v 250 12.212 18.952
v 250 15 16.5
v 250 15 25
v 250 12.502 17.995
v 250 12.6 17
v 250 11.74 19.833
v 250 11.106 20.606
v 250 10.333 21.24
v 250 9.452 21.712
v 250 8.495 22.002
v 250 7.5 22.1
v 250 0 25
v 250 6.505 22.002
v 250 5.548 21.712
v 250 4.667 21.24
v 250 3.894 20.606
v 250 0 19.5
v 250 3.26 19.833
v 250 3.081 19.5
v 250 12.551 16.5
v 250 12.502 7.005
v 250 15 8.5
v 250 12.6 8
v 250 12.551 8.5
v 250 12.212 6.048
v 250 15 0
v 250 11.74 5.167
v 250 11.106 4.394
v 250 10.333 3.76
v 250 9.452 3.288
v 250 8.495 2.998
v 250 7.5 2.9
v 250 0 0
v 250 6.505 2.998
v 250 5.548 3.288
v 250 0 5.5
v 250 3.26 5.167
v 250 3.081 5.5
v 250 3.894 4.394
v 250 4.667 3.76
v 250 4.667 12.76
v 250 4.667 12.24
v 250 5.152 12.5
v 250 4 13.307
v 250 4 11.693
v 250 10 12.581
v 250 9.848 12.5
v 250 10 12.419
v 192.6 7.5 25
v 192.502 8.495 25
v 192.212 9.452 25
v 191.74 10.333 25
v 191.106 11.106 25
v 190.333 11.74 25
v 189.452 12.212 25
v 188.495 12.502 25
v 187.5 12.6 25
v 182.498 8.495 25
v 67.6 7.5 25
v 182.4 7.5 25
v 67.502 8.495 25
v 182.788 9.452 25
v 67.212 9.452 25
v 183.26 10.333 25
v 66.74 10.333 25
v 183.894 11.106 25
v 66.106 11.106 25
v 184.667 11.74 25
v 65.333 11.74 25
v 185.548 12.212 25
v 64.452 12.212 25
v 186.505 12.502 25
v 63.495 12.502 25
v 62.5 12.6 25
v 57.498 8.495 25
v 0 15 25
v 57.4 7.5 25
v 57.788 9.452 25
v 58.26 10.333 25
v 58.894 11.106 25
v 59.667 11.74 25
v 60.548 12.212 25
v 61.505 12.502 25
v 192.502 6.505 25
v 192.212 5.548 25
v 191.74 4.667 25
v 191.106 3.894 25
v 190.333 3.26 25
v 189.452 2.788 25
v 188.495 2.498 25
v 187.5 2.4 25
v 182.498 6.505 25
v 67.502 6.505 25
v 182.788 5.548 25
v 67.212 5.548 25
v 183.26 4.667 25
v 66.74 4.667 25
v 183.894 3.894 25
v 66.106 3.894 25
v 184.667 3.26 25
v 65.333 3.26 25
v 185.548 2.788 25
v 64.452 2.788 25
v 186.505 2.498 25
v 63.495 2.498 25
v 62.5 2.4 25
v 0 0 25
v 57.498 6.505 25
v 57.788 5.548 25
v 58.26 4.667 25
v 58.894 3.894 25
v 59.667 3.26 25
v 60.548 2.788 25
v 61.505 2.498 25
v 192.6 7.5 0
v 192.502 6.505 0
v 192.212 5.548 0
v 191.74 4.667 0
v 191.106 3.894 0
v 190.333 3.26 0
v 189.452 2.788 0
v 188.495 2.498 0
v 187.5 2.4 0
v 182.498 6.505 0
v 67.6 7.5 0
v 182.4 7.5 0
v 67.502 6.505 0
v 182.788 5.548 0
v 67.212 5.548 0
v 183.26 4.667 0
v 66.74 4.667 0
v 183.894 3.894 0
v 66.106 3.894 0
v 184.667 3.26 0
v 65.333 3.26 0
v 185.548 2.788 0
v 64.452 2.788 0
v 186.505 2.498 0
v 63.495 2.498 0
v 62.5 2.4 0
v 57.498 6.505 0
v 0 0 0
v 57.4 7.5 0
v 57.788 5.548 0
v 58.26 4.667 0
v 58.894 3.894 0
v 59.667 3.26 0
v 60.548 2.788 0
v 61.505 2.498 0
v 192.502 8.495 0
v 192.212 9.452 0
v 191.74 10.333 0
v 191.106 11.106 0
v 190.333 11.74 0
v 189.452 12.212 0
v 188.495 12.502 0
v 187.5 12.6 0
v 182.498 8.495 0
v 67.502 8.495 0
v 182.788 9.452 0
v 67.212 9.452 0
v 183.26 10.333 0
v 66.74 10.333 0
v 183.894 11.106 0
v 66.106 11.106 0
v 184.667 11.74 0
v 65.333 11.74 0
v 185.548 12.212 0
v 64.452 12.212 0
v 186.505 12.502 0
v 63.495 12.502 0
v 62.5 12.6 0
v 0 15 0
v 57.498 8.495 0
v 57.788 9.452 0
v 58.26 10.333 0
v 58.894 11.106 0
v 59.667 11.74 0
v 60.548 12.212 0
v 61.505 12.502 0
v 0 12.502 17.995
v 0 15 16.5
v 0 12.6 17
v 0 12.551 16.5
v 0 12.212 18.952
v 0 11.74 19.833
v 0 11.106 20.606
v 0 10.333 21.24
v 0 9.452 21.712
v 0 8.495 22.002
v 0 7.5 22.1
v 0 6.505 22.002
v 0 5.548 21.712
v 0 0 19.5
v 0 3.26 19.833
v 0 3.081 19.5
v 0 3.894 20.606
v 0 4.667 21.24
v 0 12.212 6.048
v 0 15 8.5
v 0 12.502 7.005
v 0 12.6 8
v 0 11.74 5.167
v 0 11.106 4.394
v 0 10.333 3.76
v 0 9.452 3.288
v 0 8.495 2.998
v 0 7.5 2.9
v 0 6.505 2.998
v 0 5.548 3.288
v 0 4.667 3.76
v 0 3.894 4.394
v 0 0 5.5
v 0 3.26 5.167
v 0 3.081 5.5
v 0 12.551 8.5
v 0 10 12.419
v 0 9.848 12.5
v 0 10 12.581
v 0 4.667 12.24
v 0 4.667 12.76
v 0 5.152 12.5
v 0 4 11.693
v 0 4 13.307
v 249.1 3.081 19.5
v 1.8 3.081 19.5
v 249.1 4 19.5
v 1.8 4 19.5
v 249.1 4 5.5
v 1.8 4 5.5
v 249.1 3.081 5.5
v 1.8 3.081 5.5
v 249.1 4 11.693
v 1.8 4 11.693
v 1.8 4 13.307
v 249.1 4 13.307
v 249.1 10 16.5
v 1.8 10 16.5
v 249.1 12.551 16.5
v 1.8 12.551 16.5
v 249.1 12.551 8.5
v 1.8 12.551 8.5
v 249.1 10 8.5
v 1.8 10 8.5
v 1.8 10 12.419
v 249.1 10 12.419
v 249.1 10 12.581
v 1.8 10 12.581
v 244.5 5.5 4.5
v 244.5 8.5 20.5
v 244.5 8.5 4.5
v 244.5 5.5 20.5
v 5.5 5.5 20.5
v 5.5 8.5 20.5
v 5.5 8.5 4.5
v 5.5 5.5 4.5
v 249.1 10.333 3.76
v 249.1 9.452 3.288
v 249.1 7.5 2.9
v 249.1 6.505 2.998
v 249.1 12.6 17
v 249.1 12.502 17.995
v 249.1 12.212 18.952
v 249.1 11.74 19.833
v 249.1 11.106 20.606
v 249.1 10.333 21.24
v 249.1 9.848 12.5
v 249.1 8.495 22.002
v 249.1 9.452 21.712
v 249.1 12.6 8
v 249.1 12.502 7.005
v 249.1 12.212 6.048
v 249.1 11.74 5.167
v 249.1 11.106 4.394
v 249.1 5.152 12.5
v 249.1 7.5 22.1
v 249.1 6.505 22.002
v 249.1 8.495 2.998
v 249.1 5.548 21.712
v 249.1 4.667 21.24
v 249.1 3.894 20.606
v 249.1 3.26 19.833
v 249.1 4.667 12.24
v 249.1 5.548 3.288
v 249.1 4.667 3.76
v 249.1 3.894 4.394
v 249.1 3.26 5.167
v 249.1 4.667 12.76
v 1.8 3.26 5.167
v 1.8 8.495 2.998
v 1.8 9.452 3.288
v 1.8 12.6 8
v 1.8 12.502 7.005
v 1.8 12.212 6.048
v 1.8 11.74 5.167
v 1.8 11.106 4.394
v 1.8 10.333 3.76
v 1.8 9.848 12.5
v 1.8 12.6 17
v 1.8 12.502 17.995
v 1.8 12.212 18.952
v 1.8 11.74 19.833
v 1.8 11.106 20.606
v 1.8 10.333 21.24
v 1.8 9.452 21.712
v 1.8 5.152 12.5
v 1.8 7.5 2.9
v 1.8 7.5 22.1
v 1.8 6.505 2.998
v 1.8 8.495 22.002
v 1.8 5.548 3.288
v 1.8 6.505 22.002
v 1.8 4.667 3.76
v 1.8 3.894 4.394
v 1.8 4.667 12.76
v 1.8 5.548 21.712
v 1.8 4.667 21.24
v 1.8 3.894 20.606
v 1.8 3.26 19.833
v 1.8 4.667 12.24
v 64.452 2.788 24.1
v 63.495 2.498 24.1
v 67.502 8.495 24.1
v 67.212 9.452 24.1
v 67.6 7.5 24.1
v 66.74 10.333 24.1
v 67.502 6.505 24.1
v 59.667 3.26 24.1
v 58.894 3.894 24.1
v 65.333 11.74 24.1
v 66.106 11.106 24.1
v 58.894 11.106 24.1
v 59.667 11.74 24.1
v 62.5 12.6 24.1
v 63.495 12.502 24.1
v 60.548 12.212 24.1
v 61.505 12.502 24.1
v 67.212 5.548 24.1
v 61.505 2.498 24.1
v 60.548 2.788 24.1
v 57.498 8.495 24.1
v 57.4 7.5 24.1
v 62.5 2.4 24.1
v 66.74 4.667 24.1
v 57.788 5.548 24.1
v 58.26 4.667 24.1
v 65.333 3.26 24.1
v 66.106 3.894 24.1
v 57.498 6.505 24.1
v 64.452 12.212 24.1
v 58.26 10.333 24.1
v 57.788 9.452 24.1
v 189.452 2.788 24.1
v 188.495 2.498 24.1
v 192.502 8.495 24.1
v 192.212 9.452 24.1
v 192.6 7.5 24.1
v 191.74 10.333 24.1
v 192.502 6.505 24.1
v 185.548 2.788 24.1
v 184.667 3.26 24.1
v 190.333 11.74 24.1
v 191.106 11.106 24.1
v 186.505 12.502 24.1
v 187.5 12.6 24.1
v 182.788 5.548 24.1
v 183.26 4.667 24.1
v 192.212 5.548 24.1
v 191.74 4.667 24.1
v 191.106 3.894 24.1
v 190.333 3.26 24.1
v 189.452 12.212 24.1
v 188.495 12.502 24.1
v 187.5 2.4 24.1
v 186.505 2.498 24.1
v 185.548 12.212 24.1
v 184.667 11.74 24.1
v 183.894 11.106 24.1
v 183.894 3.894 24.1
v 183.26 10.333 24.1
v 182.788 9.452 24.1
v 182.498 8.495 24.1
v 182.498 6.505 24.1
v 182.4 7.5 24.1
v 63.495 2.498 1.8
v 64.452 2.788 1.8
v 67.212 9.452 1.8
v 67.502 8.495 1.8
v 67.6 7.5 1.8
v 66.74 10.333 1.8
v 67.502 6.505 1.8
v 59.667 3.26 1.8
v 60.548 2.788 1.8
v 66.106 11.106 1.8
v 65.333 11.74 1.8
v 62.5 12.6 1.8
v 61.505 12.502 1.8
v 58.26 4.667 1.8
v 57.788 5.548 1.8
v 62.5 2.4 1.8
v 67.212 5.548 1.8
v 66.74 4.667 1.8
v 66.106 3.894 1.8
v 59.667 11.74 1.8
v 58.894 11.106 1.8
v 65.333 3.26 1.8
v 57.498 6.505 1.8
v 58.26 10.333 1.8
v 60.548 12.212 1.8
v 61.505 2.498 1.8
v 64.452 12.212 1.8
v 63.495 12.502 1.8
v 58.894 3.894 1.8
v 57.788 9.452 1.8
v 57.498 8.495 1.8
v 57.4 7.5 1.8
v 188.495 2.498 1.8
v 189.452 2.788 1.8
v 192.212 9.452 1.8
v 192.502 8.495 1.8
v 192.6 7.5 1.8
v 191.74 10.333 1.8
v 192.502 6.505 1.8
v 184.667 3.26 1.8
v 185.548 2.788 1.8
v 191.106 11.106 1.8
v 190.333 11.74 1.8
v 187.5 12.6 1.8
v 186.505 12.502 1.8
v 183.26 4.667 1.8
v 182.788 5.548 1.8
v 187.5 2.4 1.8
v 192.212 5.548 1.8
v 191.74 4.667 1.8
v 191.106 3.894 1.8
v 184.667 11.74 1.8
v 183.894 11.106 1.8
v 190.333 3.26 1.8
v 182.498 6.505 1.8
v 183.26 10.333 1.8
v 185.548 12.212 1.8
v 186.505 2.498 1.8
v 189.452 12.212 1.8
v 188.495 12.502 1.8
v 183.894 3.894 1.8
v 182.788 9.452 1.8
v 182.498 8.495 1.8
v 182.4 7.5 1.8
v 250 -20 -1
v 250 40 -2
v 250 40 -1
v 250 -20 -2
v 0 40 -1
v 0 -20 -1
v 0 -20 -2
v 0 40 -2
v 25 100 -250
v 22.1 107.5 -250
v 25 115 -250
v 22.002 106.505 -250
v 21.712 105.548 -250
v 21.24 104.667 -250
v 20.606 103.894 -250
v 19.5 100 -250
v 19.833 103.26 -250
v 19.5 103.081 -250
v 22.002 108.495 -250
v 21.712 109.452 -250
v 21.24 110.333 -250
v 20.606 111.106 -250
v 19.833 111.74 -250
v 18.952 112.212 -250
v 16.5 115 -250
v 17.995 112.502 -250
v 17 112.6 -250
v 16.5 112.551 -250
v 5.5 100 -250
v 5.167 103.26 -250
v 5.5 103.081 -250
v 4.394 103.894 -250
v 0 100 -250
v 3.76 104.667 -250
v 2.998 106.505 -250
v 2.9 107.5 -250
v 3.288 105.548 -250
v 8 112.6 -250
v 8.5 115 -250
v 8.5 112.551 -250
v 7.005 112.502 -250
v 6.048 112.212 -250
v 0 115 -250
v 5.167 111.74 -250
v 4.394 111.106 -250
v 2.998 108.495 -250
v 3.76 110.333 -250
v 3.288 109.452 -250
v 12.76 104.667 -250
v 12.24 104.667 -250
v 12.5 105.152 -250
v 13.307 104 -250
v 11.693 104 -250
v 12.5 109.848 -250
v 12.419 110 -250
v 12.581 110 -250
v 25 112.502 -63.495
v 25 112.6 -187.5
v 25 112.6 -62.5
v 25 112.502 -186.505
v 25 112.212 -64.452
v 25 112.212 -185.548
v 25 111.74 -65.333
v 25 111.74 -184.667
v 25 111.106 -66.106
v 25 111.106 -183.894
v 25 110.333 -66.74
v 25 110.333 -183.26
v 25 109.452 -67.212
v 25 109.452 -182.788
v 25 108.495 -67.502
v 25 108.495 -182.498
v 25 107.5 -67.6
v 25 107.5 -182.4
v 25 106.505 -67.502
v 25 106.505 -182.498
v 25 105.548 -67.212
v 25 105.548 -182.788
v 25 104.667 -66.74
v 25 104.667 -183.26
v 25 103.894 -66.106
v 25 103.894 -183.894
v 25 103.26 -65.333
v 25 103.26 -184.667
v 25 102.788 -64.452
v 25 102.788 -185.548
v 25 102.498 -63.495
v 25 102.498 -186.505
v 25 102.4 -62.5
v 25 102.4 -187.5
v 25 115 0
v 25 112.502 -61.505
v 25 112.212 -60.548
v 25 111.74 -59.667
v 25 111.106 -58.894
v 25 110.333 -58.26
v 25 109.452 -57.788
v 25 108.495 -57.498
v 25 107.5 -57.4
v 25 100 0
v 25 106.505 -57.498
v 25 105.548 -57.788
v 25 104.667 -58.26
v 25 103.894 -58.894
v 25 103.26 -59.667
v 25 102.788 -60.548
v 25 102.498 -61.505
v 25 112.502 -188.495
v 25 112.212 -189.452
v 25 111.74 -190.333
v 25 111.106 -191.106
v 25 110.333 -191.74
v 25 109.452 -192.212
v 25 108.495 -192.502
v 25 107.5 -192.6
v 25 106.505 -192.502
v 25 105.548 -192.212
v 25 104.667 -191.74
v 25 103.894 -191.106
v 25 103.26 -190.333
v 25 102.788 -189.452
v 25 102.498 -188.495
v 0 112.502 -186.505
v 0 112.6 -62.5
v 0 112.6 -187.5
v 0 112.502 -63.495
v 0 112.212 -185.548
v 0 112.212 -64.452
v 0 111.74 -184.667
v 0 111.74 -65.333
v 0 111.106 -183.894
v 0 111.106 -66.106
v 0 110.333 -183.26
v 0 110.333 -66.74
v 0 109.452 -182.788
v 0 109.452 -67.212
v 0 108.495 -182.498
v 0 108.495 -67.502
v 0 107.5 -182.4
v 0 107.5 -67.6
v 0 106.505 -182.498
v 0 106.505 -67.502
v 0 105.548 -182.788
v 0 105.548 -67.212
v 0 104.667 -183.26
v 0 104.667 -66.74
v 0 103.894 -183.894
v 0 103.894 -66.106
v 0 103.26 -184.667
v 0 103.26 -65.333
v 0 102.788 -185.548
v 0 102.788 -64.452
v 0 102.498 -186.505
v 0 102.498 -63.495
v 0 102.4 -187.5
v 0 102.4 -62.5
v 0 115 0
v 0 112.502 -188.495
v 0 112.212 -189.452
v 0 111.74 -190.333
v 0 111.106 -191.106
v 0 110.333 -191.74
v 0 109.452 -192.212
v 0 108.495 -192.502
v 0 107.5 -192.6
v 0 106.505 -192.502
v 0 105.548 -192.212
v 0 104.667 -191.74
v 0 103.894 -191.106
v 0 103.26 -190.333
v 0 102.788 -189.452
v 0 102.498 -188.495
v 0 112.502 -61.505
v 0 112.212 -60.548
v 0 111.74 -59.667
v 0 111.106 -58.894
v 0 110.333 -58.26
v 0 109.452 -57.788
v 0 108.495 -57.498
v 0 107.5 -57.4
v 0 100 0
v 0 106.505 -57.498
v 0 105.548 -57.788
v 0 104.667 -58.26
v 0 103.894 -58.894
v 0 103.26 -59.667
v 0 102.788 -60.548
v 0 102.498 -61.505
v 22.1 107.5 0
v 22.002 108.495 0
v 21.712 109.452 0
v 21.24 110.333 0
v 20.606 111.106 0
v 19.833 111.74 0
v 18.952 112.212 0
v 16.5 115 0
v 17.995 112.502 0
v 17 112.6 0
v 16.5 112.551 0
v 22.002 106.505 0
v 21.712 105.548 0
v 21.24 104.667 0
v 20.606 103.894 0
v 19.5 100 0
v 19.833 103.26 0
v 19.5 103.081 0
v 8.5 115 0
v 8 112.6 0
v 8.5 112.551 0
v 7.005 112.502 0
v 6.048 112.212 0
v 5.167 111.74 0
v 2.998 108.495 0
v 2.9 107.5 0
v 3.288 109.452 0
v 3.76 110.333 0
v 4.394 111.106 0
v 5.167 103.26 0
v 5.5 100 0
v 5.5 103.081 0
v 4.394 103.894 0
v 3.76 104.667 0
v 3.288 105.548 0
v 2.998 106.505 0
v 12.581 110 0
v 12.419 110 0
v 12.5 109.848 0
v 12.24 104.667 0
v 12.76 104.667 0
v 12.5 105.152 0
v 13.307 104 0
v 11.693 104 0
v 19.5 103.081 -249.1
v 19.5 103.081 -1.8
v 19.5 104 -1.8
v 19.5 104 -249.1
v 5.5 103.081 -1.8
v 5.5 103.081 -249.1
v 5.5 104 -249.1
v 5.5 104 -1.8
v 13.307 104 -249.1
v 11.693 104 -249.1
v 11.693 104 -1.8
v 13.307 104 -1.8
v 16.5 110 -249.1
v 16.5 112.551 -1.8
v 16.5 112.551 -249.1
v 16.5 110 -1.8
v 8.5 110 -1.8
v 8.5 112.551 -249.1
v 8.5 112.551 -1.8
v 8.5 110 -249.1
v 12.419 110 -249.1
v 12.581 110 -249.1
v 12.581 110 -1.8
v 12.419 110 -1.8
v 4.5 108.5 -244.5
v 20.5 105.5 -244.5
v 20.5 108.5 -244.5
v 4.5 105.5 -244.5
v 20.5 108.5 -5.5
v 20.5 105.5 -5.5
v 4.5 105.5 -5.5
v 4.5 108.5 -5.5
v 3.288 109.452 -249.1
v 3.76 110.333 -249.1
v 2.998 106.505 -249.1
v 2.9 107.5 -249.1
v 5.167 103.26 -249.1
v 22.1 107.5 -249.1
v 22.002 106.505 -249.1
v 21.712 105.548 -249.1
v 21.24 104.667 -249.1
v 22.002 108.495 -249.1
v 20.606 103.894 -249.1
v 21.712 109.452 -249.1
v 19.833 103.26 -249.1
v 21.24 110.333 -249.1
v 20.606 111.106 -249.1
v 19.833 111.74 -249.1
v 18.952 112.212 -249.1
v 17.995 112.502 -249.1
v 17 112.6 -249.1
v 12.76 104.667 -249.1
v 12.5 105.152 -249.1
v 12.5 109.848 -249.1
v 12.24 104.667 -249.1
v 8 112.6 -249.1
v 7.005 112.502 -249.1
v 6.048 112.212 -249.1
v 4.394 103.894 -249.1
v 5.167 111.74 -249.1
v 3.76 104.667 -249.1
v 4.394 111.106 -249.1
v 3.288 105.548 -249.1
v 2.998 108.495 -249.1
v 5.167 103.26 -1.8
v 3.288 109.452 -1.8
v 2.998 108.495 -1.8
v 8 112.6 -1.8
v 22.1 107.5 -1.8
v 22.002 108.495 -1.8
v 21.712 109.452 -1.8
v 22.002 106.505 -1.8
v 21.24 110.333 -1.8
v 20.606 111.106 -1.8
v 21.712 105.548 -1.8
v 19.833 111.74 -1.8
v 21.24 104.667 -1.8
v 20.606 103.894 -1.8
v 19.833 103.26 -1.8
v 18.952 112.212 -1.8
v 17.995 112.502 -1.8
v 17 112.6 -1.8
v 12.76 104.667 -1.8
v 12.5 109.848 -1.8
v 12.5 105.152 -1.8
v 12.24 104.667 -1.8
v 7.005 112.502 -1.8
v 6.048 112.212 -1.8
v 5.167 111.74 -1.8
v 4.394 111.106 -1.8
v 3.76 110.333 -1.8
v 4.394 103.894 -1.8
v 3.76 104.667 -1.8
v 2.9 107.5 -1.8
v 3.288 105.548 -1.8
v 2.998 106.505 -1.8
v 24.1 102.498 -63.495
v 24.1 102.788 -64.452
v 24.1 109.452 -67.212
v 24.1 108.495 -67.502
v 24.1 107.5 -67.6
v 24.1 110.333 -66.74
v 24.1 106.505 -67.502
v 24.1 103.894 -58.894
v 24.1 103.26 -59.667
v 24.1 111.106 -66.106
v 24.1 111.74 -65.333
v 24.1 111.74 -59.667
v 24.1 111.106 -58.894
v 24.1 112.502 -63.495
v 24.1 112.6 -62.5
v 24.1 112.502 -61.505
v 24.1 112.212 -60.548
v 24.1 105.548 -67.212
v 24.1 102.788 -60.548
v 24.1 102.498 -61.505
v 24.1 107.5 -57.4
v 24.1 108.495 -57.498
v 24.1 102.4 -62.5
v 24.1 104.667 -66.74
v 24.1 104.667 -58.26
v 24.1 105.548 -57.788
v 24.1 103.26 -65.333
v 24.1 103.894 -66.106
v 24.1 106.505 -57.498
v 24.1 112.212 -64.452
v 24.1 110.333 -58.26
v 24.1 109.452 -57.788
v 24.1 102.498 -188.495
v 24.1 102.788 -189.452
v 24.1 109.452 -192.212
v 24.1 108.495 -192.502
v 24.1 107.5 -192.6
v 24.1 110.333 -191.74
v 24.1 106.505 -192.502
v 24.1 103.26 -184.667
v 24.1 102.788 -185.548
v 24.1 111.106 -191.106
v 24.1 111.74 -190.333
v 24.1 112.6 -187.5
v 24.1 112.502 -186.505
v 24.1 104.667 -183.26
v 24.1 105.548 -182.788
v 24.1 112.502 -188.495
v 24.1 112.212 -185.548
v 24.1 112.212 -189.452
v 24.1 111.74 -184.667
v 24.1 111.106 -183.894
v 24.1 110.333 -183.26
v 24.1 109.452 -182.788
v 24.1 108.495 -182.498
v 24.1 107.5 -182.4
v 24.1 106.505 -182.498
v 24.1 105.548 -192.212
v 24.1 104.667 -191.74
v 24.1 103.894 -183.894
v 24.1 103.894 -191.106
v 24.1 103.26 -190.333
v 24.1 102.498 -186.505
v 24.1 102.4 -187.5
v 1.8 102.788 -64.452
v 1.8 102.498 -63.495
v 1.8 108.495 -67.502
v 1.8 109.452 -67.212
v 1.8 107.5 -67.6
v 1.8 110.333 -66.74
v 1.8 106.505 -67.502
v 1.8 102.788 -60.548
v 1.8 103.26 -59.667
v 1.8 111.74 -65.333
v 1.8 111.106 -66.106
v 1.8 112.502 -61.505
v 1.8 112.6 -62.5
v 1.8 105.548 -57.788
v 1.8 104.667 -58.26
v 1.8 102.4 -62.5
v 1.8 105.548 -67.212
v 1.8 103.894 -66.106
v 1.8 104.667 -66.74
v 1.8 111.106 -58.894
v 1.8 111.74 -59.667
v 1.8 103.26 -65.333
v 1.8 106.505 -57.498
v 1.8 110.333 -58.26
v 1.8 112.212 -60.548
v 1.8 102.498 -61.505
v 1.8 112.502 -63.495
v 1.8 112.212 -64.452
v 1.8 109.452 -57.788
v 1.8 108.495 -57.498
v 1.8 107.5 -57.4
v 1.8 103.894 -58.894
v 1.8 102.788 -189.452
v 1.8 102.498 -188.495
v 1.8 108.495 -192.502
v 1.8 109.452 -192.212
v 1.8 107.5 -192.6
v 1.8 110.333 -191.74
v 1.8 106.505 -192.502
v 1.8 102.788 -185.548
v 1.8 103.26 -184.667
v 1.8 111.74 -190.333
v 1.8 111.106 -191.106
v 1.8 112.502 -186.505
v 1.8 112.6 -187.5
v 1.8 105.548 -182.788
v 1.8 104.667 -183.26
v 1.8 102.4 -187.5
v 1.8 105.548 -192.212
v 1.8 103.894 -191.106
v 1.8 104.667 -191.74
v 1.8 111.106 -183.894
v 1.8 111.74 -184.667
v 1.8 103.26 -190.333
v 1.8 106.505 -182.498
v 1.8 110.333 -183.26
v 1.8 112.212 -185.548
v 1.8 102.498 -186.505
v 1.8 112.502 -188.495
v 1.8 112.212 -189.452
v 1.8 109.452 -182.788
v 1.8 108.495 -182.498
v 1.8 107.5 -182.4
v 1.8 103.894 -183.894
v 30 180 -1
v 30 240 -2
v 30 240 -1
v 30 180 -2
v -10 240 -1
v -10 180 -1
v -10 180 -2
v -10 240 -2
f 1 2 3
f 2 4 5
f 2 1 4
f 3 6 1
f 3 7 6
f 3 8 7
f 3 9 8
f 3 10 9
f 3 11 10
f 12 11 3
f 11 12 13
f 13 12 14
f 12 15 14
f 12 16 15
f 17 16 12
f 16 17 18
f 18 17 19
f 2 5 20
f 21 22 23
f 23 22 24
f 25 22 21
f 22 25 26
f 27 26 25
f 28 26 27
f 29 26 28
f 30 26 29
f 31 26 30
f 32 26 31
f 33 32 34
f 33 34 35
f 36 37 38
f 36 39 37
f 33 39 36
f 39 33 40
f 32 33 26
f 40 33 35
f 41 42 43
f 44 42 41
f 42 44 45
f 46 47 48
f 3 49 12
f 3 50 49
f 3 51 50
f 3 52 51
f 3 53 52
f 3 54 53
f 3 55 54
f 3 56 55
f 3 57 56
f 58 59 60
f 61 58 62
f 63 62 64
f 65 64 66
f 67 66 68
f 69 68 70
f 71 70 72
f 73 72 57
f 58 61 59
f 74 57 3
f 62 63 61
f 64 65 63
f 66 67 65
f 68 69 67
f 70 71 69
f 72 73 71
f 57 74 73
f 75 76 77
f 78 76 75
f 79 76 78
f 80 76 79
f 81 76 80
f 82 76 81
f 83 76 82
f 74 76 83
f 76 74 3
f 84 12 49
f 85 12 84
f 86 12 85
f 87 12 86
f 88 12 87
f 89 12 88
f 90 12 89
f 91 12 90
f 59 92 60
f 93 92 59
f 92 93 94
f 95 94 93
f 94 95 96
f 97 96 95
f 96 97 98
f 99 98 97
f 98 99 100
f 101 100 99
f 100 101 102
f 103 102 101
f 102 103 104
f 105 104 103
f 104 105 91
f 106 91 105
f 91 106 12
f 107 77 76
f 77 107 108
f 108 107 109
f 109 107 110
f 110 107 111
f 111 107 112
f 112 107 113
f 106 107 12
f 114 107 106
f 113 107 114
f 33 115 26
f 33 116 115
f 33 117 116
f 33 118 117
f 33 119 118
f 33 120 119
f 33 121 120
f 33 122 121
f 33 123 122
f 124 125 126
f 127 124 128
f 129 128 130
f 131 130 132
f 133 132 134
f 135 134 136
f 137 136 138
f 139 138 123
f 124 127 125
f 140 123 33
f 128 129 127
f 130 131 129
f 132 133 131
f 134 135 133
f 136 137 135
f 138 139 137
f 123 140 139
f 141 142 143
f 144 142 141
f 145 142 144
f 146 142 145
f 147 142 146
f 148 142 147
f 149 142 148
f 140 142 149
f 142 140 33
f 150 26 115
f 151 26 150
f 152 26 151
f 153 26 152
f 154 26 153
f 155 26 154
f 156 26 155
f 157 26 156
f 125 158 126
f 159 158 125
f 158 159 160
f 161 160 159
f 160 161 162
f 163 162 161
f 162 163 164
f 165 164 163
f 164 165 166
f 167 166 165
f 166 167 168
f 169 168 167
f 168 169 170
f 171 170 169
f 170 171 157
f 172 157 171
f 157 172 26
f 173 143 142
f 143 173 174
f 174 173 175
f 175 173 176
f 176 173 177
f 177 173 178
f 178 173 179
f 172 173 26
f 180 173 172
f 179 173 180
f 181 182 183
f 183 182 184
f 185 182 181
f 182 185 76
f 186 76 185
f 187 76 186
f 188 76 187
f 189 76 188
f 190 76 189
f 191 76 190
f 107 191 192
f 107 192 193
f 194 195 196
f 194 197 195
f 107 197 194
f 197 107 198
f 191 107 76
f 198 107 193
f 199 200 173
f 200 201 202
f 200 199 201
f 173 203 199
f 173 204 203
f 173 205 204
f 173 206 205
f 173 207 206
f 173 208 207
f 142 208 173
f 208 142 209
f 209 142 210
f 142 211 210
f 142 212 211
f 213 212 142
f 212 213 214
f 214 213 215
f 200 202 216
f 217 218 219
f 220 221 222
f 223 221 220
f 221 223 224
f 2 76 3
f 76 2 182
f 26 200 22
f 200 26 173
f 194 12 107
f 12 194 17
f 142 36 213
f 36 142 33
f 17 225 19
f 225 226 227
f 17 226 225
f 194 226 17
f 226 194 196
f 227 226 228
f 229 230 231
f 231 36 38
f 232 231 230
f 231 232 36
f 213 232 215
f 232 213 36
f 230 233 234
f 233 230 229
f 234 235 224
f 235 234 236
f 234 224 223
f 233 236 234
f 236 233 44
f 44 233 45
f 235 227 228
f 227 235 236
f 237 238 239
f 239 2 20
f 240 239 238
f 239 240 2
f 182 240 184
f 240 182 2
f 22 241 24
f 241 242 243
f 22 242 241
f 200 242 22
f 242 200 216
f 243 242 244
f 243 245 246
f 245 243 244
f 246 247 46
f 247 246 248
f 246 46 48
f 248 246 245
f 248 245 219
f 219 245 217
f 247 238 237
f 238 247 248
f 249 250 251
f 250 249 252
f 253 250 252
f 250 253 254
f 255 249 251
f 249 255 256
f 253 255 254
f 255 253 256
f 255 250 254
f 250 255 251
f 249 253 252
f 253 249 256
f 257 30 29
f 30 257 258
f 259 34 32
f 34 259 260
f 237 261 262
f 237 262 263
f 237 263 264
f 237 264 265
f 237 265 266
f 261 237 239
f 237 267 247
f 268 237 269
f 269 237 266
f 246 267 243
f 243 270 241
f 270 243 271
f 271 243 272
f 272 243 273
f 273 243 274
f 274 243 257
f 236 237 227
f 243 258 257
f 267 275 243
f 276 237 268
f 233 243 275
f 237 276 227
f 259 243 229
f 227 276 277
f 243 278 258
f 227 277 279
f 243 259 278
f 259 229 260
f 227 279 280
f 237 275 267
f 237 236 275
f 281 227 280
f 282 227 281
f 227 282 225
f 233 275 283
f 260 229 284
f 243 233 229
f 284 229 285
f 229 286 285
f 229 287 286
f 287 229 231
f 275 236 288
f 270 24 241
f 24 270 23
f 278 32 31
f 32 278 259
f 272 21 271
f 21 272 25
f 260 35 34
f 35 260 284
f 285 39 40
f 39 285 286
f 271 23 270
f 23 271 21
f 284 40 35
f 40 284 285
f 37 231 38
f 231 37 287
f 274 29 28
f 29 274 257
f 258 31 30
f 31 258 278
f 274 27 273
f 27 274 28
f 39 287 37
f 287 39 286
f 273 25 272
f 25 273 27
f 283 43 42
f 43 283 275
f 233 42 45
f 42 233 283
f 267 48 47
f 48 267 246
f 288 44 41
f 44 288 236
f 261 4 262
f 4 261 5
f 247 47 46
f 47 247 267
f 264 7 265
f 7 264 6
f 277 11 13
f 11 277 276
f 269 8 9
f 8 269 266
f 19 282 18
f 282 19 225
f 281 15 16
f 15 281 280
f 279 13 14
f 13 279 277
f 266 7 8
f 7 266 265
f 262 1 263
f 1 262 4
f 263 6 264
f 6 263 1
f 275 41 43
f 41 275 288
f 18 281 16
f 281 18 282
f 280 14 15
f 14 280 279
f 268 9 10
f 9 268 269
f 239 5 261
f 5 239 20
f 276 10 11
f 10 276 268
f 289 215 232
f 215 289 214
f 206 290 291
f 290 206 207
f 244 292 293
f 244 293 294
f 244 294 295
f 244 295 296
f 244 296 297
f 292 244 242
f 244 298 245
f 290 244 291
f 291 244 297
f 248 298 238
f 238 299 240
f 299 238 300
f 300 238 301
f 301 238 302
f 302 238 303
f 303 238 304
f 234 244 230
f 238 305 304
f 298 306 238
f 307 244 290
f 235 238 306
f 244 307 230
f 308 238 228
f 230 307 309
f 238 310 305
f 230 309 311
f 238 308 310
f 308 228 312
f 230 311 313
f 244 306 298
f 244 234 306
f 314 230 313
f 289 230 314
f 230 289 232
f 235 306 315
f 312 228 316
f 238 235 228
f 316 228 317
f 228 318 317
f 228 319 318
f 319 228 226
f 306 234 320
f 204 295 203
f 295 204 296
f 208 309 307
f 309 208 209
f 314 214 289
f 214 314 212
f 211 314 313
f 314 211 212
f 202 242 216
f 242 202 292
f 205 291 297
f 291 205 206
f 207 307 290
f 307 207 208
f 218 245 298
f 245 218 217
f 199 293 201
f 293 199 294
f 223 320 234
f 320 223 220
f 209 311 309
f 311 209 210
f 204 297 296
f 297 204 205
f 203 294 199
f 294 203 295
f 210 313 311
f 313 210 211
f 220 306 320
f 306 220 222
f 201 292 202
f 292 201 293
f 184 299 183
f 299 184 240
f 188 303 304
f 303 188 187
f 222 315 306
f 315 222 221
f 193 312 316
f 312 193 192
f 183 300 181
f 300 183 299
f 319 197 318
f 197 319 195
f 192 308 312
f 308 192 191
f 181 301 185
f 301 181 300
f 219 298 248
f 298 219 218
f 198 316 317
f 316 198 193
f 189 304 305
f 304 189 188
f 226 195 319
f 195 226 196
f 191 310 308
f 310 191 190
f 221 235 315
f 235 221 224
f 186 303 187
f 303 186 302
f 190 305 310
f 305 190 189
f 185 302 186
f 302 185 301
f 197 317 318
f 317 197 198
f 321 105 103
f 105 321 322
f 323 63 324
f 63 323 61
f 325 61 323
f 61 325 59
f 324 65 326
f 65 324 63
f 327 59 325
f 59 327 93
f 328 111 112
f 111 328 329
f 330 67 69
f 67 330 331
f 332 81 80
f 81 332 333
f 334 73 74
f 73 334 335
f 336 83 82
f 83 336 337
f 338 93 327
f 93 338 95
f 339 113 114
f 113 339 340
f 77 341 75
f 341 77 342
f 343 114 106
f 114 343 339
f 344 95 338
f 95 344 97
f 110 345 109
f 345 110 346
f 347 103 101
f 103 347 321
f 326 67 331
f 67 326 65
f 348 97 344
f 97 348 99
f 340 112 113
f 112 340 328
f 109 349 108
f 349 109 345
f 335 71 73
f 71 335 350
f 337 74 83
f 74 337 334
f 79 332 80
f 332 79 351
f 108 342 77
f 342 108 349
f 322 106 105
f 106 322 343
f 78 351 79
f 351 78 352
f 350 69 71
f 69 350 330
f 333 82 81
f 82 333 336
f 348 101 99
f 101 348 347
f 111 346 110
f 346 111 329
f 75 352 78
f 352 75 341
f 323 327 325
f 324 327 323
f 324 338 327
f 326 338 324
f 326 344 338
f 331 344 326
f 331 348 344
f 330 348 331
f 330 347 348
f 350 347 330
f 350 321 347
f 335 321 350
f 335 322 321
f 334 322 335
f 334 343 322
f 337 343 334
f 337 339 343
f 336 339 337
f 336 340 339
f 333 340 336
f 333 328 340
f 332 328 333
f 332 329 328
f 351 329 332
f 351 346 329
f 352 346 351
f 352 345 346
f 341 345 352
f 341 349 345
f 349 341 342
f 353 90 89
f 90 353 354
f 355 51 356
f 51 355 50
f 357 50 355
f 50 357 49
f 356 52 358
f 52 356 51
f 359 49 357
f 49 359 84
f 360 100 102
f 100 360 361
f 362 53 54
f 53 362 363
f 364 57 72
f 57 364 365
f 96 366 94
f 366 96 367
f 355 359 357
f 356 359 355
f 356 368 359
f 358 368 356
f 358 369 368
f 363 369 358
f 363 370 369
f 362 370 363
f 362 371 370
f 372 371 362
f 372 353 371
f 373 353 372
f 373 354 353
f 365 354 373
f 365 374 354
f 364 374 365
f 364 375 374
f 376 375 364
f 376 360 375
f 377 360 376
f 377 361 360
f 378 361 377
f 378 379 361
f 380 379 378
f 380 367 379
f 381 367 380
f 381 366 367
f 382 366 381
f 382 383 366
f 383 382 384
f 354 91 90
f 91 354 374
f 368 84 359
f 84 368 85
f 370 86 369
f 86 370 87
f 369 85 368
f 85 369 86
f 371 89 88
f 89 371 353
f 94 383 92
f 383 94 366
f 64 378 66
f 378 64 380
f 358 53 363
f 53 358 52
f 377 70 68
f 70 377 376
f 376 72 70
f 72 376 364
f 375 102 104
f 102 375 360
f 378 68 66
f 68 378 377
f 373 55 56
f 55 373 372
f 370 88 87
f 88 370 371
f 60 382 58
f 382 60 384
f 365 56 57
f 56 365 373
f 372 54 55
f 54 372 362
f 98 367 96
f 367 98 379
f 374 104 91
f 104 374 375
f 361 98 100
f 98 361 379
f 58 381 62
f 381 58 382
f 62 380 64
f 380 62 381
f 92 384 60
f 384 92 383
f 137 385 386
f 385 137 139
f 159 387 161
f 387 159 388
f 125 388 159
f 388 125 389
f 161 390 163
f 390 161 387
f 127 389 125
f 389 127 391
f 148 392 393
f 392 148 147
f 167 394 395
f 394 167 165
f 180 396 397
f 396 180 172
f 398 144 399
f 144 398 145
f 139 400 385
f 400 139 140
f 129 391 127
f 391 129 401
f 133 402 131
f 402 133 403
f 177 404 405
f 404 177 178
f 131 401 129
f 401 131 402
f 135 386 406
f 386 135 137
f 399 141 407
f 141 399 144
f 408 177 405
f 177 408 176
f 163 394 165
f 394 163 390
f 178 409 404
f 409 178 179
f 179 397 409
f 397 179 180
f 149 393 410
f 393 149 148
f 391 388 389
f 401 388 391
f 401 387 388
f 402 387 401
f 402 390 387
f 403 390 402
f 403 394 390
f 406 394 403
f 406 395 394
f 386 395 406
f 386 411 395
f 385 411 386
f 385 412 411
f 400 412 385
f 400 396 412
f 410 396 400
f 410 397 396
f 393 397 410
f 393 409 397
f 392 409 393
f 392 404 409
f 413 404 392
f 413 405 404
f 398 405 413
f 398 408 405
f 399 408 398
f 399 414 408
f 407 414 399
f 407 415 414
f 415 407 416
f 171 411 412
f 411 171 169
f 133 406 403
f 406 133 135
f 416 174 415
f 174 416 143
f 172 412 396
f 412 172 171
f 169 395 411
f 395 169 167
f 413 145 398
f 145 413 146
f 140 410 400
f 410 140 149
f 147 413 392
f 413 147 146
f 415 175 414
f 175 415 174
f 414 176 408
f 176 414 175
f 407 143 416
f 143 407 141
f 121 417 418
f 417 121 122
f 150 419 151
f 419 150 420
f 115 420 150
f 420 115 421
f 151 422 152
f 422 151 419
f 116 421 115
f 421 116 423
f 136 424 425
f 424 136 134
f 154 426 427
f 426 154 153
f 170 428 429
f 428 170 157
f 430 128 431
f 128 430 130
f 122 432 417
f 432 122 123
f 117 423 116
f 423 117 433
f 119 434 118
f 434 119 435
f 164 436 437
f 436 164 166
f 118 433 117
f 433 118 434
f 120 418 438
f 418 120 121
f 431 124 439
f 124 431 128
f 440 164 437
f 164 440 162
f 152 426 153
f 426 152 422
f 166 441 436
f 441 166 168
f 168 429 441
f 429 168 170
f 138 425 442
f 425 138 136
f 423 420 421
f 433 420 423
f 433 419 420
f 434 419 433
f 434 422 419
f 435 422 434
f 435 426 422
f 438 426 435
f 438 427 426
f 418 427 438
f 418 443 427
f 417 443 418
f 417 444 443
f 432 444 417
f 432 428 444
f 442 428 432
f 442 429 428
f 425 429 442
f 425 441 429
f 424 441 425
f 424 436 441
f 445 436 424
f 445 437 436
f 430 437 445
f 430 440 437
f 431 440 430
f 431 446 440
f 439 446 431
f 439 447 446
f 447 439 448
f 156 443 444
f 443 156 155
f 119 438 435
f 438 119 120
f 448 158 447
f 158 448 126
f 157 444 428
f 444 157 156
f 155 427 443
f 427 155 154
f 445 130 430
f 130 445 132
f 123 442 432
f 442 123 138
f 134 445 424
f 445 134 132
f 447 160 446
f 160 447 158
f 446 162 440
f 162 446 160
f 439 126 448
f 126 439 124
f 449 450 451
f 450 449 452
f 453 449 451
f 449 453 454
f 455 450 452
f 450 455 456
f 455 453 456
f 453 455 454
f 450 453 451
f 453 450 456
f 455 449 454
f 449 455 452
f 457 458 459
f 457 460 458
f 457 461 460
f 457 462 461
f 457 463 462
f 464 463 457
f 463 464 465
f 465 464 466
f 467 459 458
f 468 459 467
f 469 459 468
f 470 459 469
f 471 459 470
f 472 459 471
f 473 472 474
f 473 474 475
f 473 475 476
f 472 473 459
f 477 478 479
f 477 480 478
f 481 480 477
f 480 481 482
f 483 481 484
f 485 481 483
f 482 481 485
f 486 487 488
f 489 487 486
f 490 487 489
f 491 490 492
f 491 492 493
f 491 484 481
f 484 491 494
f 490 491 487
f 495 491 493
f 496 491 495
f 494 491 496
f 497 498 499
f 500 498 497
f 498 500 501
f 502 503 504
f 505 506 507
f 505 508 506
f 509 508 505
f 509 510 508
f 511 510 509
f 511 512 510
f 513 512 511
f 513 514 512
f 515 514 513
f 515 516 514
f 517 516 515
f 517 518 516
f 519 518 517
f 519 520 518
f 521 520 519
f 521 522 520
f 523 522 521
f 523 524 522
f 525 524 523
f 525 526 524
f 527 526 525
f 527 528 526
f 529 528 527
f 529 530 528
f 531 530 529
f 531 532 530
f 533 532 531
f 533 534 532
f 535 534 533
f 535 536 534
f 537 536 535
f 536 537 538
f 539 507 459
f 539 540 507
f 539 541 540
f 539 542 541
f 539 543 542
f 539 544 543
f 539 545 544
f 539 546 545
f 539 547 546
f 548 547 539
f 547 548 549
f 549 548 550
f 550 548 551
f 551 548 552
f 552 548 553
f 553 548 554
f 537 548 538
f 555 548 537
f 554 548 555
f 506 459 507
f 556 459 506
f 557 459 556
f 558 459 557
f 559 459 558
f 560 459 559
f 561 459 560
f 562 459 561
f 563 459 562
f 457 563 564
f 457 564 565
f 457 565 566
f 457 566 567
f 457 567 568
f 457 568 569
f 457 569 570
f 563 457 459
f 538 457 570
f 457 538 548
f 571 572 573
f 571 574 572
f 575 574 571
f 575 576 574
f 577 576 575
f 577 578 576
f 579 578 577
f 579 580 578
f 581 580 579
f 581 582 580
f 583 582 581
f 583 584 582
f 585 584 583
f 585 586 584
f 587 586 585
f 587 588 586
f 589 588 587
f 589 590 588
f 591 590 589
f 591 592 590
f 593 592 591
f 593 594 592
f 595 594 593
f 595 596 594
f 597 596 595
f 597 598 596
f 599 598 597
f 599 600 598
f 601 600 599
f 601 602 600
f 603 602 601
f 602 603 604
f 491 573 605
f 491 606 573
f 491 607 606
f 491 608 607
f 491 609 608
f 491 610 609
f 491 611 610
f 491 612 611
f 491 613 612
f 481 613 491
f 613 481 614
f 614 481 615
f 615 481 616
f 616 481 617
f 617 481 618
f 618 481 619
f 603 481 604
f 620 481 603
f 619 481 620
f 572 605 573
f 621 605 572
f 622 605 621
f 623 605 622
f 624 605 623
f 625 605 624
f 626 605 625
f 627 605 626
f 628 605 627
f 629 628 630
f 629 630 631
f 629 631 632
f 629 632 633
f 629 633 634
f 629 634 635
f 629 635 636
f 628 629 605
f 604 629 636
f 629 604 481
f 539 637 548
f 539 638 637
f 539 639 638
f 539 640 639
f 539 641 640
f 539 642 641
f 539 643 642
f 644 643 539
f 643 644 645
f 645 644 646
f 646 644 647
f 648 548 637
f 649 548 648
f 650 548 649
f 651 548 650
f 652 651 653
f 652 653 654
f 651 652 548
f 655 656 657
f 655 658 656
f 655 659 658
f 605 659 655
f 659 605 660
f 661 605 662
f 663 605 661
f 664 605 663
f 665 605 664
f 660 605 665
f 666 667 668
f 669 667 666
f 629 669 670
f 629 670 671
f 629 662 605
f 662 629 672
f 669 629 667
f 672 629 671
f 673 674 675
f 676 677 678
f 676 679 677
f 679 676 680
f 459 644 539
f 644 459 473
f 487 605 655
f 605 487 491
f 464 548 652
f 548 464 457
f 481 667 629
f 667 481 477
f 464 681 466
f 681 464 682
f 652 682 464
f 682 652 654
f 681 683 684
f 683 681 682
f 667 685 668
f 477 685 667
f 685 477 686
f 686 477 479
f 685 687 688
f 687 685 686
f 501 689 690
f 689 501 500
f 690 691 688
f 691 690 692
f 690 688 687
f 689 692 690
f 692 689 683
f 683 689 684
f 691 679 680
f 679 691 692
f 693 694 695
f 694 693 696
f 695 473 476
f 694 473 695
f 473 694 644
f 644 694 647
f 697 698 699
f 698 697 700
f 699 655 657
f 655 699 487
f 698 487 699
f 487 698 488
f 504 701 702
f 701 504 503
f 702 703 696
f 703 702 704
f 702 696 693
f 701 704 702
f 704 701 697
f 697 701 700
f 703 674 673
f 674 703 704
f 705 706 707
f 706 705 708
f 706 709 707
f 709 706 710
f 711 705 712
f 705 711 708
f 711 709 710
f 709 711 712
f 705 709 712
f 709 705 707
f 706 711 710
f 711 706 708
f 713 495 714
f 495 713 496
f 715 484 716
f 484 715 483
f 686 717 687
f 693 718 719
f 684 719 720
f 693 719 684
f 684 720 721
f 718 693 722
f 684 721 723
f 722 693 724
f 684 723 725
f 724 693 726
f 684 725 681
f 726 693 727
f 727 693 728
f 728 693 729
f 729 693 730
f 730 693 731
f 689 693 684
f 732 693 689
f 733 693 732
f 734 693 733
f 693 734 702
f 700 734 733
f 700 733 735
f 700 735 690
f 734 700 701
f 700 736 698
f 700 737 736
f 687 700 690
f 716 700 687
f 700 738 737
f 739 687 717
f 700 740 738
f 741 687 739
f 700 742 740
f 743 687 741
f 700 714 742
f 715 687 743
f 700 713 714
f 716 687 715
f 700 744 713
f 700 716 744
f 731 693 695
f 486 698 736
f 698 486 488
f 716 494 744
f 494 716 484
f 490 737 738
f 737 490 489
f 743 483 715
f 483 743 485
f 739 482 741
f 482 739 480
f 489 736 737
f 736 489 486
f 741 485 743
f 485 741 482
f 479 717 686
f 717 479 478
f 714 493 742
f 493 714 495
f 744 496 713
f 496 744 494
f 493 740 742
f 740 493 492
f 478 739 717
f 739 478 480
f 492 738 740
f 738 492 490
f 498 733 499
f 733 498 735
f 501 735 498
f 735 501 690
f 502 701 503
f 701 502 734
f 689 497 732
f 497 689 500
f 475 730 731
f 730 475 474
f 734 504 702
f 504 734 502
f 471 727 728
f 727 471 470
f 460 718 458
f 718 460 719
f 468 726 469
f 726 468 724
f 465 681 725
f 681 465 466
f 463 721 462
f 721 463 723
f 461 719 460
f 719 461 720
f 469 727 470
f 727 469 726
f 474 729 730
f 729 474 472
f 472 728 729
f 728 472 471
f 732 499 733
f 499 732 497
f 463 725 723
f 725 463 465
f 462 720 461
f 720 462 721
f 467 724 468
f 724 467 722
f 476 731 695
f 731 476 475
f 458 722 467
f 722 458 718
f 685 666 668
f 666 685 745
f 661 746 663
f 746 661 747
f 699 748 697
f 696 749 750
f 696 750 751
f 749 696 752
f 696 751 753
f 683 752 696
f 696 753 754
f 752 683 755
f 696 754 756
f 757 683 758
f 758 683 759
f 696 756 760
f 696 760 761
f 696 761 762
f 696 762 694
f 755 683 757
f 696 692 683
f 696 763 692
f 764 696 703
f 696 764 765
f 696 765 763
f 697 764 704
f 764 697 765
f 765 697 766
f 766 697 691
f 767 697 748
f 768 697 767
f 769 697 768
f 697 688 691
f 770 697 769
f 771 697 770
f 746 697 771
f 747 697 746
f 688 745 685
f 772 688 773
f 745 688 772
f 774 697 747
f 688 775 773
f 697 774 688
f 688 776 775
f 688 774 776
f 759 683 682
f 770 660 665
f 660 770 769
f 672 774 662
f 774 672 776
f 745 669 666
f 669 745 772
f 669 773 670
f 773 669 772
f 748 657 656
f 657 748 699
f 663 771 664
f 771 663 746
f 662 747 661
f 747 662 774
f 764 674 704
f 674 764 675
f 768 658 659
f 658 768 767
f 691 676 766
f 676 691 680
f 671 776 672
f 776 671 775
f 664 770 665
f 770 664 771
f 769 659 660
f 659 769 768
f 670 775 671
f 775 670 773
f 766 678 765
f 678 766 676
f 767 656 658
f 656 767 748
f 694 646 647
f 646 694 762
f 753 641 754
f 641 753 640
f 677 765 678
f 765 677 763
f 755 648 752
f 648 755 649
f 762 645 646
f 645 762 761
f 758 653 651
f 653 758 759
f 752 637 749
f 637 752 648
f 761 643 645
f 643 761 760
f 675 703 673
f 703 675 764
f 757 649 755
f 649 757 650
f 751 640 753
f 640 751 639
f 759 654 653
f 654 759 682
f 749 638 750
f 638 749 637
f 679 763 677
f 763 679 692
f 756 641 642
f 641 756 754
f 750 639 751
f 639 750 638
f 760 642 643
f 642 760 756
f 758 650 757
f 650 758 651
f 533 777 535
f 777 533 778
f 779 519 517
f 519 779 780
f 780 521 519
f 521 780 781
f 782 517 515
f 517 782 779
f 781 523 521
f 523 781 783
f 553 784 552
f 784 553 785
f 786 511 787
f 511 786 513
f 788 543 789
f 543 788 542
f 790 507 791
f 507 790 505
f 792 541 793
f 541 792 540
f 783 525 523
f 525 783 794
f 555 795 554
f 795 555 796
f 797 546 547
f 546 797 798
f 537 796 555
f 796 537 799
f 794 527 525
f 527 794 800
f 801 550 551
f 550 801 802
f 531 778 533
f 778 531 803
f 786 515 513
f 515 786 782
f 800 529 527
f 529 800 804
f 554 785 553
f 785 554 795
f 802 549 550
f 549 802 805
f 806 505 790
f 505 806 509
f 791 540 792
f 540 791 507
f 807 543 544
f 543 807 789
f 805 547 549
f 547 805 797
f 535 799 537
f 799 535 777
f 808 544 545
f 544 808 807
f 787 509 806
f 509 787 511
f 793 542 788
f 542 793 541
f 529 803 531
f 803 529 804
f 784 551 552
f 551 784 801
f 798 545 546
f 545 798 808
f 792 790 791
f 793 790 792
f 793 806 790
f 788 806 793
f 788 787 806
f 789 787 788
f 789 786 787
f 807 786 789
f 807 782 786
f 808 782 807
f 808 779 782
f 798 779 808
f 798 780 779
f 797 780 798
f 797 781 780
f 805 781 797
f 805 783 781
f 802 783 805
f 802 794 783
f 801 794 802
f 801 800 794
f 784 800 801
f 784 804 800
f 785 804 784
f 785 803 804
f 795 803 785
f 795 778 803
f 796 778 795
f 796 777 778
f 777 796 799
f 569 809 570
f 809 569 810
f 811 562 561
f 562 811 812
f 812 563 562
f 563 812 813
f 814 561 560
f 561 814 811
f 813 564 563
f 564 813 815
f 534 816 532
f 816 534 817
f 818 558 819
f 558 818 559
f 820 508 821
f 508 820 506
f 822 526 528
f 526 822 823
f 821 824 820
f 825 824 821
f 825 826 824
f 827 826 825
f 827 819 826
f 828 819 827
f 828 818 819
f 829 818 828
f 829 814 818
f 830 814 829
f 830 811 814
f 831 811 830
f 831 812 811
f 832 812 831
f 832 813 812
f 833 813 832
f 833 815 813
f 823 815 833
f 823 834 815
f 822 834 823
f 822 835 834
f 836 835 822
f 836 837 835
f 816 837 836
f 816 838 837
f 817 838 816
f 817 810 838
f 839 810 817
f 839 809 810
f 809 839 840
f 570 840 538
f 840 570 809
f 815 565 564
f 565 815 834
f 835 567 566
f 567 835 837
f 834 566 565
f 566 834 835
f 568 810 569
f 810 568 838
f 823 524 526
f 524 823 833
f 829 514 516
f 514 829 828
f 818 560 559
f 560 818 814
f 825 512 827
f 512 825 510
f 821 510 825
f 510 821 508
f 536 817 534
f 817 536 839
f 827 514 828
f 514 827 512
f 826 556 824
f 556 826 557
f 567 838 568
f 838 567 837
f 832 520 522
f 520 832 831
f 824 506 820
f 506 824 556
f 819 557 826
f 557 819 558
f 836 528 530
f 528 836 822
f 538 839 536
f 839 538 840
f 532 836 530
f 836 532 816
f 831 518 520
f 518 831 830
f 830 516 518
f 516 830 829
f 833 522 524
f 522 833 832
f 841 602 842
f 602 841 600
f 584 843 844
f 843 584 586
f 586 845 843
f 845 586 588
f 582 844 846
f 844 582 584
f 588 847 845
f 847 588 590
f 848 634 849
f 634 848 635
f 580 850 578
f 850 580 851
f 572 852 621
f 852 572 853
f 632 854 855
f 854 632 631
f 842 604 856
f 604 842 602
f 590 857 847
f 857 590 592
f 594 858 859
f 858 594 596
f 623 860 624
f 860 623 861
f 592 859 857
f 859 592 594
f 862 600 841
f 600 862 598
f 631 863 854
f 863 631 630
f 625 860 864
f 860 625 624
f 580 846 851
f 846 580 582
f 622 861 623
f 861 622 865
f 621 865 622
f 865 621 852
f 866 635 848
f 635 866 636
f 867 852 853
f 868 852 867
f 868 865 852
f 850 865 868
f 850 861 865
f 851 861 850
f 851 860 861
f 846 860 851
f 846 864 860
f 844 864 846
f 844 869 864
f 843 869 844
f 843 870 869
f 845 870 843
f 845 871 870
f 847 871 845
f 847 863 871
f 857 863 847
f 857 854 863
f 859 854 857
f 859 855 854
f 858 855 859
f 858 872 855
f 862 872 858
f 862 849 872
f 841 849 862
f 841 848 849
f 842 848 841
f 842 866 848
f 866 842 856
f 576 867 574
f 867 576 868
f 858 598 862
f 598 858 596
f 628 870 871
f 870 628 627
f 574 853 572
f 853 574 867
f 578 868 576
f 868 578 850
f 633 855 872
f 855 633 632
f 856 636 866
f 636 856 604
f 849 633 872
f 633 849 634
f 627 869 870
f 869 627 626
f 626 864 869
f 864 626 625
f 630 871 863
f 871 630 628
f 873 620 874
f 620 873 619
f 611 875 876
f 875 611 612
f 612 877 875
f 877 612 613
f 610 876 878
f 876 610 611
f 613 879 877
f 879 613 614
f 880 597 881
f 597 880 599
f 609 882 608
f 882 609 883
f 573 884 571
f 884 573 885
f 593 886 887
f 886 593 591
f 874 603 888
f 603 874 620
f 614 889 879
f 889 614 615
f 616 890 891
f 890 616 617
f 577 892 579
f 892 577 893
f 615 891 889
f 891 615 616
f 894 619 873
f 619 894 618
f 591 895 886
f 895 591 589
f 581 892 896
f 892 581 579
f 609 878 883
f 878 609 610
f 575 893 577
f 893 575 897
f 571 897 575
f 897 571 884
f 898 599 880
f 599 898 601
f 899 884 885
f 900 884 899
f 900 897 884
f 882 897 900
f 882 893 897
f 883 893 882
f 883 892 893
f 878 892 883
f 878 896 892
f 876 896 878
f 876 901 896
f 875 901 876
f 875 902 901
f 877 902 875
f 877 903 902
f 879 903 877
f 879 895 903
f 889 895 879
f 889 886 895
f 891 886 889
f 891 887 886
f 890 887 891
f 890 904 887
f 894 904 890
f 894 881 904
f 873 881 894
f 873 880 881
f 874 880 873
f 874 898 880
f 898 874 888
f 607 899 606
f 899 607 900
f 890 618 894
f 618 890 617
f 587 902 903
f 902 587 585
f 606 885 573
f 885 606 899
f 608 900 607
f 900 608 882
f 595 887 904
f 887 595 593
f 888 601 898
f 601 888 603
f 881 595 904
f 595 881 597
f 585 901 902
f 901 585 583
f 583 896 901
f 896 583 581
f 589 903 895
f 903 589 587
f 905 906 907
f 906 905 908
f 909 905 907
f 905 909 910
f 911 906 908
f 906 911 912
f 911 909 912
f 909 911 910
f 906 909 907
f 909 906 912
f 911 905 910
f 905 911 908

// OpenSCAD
// file: single_module.scad
/*
 * Single LED Strip Module - Minimal Design
 * Compact holder for one section of WS2812B LED strip
 *
 * Features:
 * - Minimal size - just enough to hold the strip
 * - 4 magnet holes for modular connections
 * - Lightweight and movable
 */

// ========== CONFIGURATION ==========

// LED Strip dimensions
strip_segment_length = 250;  // Length of this module
strip_width = 12;            // WS2812B strip width

// Module dimensions (MINIMIZED)
module_width = strip_segment_length;
module_height = 25;          // 2.5cm vertical spacing (compact!)
module_depth = 15;           // Reduced from 20mm to 15mm
wall_thickness = 1.5;        // Reduced from 2mm to 1.5mm

// LED channel (on front)
led_channel_depth = 4;       // Shallow groove (reduced from 5mm)
led_channel_width = 14;      // Increased to 14mm for better fit

// Wire channel (on back)
wire_channel_width = 8;      // Narrow channel for wires
wire_channel_depth = 5;      // Back routing space

// Magnets (user's magnets: 10mm dia × 1.54mm thick)
magnet_dia = 10.2;           // 10mm + 0.2mm tolerance
magnet_thickness = 1.8;      // 1.54mm + tolerance (thin!)
magnet_inset = 8;            // Distance from edges (adjusted for 25mm height)

// ========== SINGLE MODULE ==========

module minimal_strip_holder() {
    difference() {
        // Main body - thin shell
        cube([module_width, module_depth, module_height]);

        // Front LED channel (OPEN ENDS - strip passes through)
        translate([-0.1, -0.1, module_height/2 - led_channel_width/2])
            cube([module_width + 0.2,  // Goes all the way through left to right
                  led_channel_depth + 0.1,
                  led_channel_width]);

        // Back wire channel (OPEN ENDS - wires pass through)
        translate([-0.1, module_depth - wire_channel_depth, module_height/2 - wire_channel_width/2])
            cube([module_width + 0.2,  // Goes all the way through left to right
                  wire_channel_depth + 0.1,
                  wire_channel_width]);

        // Center cavity (weight reduction)
        translate([wall_thickness + 4,
                  led_channel_depth + wall_thickness,
                  wall_thickness + 3])
            cube([module_width - 2*wall_thickness - 8,
                  module_depth - led_channel_depth - wire_channel_depth - 2*wall_thickness,
                  module_height - 2*wall_thickness - 6]);

        // HORIZONTAL magnets (left/right)
        // Right side
        translate([module_width - magnet_thickness/2, module_depth/2, magnet_inset])
            rotate([0, 90, 0])
            cylinder(h=magnet_thickness + 0.1, d=magnet_dia, $fn=32);
        translate([module_width - magnet_thickness/2, module_depth/2, module_height - magnet_inset])
            rotate([0, 90, 0])
            cylinder(h=magnet_thickness + 0.1, d=magnet_dia, $fn=32);

        // Left side
        translate([-0.1, module_depth/2, magnet_inset])
            rotate([0, 90, 0])
            cylinder(h=magnet_thickness + 0.1, d=magnet_dia, $fn=32);
        translate([-0.1, module_depth/2, module_height - magnet_inset])
            rotate([0, 90, 0])
            cylinder(h=magnet_thickness + 0.1, d=magnet_dia, $fn=32);

        // VERTICAL magnets (top/bottom)
        // Top
        translate([module_width/4, module_depth/2, module_height - magnet_thickness/2])
            cylinder(h=magnet_thickness + 0.1, d=magnet_dia, $fn=32);
        translate([3*module_width/4, module_depth/2, module_height - magnet_thickness/2])
            cylinder(h=magnet_thickness + 0.1, d=magnet_dia, $fn=32);

        // Bottom
        translate([module_width/4, module_depth/2, -0.1])
            cylinder(h=magnet_thickness + 0.1, d=magnet_dia, $fn=32);
        translate([3*module_width/4, module_depth/2, -0.1])
            cylinder(h=magnet_thickness + 0.1, d=magnet_dia, $fn=32);
    }
}

// LED strip visualization (optional)
module led_strip_visual() {
    color("white", 0.9)
    translate([wall_thickness, led_channel_depth - 3, module_height/2 - strip_width/2])
    rotate([90, 0, 0])
    cube([module_width - 2*wall_thickness, strip_width, 3]);

    // LEDs
    led_spacing = module_width / 36;  // 36 LEDs per module
    for (i = [0:35]) {
        color("gold", 0.8)
        translate([i * led_spacing + led_spacing/2,
                  1,
                  module_height/2])
            rotate([90, 0, 0])
            cylinder(h=2, d=4, $fn=6);
    }
}

// ========== RENDER ==========

// Show module
minimal_strip_holder();

// Show LED strip (uncomment to visualize)
// led_strip_visual();

// ========== EXPORT NOTES ==========
/*
 * DIMENSIONS:
 * - Size: 250mm (W) × 50mm (H) × 15mm (D)
 * - Weight: ~15-18g per module (at 15% infill)
 * - Wall thickness: 1.5mm
 *
 * MAGNETS:
 * - 4× 10mm × 3mm neodymium magnets per module
 * - Amazon: "neodymium magnets 10mm x 3mm N52"
 *
 * PRINTING:
 * - Layer height: 0.2mm
 * - Infill: 15%
 * - No supports needed
 * - Print time: ~1-1.5 hours per module
 *
 * CUSTOMIZATION:
 * - Adjust module_width for different lengths (e.g., 200mm, 333mm)
 * - Change module_height for different spacing (e.g., 30mm, 40mm, 60mm)
 * - Modify led_channel_width if your strip is wider/narrower
 *
 * EXPORT STL:
 * openscad -o module.stl single_module.scad
 */
// main file
// Import the module
use <single_module.scad>

// Show GOOD orientation
translate([0, 0, 0]) {
    rotate([0, 0, 0]) {
        minimal_strip_holder();
    }
    
    // Add text
    translate([125, -5, -10])
        color("green")
        text("✓ CORRECT", size=8, halign="center");
    
    // Show build plate
    translate([0, -20, -2])
        color("lightblue", 0.3)
        cube([250, 60, 1]);
}

// Show BAD orientation
translate([0, 100, 0]) {
    rotate([0, 90, 0]) {  // Rotated wrong!
        minimal_strip_holder();
    }
    
    // Add text
    translate([12, 80, -10])
        color("red")
        text("✗ WRONG", size=8, halign="center");
    
    // Show build plate
    translate([-10, 80, -2])
        color("lightblue", 0.3)
        cube([40, 60, 1]);
}
